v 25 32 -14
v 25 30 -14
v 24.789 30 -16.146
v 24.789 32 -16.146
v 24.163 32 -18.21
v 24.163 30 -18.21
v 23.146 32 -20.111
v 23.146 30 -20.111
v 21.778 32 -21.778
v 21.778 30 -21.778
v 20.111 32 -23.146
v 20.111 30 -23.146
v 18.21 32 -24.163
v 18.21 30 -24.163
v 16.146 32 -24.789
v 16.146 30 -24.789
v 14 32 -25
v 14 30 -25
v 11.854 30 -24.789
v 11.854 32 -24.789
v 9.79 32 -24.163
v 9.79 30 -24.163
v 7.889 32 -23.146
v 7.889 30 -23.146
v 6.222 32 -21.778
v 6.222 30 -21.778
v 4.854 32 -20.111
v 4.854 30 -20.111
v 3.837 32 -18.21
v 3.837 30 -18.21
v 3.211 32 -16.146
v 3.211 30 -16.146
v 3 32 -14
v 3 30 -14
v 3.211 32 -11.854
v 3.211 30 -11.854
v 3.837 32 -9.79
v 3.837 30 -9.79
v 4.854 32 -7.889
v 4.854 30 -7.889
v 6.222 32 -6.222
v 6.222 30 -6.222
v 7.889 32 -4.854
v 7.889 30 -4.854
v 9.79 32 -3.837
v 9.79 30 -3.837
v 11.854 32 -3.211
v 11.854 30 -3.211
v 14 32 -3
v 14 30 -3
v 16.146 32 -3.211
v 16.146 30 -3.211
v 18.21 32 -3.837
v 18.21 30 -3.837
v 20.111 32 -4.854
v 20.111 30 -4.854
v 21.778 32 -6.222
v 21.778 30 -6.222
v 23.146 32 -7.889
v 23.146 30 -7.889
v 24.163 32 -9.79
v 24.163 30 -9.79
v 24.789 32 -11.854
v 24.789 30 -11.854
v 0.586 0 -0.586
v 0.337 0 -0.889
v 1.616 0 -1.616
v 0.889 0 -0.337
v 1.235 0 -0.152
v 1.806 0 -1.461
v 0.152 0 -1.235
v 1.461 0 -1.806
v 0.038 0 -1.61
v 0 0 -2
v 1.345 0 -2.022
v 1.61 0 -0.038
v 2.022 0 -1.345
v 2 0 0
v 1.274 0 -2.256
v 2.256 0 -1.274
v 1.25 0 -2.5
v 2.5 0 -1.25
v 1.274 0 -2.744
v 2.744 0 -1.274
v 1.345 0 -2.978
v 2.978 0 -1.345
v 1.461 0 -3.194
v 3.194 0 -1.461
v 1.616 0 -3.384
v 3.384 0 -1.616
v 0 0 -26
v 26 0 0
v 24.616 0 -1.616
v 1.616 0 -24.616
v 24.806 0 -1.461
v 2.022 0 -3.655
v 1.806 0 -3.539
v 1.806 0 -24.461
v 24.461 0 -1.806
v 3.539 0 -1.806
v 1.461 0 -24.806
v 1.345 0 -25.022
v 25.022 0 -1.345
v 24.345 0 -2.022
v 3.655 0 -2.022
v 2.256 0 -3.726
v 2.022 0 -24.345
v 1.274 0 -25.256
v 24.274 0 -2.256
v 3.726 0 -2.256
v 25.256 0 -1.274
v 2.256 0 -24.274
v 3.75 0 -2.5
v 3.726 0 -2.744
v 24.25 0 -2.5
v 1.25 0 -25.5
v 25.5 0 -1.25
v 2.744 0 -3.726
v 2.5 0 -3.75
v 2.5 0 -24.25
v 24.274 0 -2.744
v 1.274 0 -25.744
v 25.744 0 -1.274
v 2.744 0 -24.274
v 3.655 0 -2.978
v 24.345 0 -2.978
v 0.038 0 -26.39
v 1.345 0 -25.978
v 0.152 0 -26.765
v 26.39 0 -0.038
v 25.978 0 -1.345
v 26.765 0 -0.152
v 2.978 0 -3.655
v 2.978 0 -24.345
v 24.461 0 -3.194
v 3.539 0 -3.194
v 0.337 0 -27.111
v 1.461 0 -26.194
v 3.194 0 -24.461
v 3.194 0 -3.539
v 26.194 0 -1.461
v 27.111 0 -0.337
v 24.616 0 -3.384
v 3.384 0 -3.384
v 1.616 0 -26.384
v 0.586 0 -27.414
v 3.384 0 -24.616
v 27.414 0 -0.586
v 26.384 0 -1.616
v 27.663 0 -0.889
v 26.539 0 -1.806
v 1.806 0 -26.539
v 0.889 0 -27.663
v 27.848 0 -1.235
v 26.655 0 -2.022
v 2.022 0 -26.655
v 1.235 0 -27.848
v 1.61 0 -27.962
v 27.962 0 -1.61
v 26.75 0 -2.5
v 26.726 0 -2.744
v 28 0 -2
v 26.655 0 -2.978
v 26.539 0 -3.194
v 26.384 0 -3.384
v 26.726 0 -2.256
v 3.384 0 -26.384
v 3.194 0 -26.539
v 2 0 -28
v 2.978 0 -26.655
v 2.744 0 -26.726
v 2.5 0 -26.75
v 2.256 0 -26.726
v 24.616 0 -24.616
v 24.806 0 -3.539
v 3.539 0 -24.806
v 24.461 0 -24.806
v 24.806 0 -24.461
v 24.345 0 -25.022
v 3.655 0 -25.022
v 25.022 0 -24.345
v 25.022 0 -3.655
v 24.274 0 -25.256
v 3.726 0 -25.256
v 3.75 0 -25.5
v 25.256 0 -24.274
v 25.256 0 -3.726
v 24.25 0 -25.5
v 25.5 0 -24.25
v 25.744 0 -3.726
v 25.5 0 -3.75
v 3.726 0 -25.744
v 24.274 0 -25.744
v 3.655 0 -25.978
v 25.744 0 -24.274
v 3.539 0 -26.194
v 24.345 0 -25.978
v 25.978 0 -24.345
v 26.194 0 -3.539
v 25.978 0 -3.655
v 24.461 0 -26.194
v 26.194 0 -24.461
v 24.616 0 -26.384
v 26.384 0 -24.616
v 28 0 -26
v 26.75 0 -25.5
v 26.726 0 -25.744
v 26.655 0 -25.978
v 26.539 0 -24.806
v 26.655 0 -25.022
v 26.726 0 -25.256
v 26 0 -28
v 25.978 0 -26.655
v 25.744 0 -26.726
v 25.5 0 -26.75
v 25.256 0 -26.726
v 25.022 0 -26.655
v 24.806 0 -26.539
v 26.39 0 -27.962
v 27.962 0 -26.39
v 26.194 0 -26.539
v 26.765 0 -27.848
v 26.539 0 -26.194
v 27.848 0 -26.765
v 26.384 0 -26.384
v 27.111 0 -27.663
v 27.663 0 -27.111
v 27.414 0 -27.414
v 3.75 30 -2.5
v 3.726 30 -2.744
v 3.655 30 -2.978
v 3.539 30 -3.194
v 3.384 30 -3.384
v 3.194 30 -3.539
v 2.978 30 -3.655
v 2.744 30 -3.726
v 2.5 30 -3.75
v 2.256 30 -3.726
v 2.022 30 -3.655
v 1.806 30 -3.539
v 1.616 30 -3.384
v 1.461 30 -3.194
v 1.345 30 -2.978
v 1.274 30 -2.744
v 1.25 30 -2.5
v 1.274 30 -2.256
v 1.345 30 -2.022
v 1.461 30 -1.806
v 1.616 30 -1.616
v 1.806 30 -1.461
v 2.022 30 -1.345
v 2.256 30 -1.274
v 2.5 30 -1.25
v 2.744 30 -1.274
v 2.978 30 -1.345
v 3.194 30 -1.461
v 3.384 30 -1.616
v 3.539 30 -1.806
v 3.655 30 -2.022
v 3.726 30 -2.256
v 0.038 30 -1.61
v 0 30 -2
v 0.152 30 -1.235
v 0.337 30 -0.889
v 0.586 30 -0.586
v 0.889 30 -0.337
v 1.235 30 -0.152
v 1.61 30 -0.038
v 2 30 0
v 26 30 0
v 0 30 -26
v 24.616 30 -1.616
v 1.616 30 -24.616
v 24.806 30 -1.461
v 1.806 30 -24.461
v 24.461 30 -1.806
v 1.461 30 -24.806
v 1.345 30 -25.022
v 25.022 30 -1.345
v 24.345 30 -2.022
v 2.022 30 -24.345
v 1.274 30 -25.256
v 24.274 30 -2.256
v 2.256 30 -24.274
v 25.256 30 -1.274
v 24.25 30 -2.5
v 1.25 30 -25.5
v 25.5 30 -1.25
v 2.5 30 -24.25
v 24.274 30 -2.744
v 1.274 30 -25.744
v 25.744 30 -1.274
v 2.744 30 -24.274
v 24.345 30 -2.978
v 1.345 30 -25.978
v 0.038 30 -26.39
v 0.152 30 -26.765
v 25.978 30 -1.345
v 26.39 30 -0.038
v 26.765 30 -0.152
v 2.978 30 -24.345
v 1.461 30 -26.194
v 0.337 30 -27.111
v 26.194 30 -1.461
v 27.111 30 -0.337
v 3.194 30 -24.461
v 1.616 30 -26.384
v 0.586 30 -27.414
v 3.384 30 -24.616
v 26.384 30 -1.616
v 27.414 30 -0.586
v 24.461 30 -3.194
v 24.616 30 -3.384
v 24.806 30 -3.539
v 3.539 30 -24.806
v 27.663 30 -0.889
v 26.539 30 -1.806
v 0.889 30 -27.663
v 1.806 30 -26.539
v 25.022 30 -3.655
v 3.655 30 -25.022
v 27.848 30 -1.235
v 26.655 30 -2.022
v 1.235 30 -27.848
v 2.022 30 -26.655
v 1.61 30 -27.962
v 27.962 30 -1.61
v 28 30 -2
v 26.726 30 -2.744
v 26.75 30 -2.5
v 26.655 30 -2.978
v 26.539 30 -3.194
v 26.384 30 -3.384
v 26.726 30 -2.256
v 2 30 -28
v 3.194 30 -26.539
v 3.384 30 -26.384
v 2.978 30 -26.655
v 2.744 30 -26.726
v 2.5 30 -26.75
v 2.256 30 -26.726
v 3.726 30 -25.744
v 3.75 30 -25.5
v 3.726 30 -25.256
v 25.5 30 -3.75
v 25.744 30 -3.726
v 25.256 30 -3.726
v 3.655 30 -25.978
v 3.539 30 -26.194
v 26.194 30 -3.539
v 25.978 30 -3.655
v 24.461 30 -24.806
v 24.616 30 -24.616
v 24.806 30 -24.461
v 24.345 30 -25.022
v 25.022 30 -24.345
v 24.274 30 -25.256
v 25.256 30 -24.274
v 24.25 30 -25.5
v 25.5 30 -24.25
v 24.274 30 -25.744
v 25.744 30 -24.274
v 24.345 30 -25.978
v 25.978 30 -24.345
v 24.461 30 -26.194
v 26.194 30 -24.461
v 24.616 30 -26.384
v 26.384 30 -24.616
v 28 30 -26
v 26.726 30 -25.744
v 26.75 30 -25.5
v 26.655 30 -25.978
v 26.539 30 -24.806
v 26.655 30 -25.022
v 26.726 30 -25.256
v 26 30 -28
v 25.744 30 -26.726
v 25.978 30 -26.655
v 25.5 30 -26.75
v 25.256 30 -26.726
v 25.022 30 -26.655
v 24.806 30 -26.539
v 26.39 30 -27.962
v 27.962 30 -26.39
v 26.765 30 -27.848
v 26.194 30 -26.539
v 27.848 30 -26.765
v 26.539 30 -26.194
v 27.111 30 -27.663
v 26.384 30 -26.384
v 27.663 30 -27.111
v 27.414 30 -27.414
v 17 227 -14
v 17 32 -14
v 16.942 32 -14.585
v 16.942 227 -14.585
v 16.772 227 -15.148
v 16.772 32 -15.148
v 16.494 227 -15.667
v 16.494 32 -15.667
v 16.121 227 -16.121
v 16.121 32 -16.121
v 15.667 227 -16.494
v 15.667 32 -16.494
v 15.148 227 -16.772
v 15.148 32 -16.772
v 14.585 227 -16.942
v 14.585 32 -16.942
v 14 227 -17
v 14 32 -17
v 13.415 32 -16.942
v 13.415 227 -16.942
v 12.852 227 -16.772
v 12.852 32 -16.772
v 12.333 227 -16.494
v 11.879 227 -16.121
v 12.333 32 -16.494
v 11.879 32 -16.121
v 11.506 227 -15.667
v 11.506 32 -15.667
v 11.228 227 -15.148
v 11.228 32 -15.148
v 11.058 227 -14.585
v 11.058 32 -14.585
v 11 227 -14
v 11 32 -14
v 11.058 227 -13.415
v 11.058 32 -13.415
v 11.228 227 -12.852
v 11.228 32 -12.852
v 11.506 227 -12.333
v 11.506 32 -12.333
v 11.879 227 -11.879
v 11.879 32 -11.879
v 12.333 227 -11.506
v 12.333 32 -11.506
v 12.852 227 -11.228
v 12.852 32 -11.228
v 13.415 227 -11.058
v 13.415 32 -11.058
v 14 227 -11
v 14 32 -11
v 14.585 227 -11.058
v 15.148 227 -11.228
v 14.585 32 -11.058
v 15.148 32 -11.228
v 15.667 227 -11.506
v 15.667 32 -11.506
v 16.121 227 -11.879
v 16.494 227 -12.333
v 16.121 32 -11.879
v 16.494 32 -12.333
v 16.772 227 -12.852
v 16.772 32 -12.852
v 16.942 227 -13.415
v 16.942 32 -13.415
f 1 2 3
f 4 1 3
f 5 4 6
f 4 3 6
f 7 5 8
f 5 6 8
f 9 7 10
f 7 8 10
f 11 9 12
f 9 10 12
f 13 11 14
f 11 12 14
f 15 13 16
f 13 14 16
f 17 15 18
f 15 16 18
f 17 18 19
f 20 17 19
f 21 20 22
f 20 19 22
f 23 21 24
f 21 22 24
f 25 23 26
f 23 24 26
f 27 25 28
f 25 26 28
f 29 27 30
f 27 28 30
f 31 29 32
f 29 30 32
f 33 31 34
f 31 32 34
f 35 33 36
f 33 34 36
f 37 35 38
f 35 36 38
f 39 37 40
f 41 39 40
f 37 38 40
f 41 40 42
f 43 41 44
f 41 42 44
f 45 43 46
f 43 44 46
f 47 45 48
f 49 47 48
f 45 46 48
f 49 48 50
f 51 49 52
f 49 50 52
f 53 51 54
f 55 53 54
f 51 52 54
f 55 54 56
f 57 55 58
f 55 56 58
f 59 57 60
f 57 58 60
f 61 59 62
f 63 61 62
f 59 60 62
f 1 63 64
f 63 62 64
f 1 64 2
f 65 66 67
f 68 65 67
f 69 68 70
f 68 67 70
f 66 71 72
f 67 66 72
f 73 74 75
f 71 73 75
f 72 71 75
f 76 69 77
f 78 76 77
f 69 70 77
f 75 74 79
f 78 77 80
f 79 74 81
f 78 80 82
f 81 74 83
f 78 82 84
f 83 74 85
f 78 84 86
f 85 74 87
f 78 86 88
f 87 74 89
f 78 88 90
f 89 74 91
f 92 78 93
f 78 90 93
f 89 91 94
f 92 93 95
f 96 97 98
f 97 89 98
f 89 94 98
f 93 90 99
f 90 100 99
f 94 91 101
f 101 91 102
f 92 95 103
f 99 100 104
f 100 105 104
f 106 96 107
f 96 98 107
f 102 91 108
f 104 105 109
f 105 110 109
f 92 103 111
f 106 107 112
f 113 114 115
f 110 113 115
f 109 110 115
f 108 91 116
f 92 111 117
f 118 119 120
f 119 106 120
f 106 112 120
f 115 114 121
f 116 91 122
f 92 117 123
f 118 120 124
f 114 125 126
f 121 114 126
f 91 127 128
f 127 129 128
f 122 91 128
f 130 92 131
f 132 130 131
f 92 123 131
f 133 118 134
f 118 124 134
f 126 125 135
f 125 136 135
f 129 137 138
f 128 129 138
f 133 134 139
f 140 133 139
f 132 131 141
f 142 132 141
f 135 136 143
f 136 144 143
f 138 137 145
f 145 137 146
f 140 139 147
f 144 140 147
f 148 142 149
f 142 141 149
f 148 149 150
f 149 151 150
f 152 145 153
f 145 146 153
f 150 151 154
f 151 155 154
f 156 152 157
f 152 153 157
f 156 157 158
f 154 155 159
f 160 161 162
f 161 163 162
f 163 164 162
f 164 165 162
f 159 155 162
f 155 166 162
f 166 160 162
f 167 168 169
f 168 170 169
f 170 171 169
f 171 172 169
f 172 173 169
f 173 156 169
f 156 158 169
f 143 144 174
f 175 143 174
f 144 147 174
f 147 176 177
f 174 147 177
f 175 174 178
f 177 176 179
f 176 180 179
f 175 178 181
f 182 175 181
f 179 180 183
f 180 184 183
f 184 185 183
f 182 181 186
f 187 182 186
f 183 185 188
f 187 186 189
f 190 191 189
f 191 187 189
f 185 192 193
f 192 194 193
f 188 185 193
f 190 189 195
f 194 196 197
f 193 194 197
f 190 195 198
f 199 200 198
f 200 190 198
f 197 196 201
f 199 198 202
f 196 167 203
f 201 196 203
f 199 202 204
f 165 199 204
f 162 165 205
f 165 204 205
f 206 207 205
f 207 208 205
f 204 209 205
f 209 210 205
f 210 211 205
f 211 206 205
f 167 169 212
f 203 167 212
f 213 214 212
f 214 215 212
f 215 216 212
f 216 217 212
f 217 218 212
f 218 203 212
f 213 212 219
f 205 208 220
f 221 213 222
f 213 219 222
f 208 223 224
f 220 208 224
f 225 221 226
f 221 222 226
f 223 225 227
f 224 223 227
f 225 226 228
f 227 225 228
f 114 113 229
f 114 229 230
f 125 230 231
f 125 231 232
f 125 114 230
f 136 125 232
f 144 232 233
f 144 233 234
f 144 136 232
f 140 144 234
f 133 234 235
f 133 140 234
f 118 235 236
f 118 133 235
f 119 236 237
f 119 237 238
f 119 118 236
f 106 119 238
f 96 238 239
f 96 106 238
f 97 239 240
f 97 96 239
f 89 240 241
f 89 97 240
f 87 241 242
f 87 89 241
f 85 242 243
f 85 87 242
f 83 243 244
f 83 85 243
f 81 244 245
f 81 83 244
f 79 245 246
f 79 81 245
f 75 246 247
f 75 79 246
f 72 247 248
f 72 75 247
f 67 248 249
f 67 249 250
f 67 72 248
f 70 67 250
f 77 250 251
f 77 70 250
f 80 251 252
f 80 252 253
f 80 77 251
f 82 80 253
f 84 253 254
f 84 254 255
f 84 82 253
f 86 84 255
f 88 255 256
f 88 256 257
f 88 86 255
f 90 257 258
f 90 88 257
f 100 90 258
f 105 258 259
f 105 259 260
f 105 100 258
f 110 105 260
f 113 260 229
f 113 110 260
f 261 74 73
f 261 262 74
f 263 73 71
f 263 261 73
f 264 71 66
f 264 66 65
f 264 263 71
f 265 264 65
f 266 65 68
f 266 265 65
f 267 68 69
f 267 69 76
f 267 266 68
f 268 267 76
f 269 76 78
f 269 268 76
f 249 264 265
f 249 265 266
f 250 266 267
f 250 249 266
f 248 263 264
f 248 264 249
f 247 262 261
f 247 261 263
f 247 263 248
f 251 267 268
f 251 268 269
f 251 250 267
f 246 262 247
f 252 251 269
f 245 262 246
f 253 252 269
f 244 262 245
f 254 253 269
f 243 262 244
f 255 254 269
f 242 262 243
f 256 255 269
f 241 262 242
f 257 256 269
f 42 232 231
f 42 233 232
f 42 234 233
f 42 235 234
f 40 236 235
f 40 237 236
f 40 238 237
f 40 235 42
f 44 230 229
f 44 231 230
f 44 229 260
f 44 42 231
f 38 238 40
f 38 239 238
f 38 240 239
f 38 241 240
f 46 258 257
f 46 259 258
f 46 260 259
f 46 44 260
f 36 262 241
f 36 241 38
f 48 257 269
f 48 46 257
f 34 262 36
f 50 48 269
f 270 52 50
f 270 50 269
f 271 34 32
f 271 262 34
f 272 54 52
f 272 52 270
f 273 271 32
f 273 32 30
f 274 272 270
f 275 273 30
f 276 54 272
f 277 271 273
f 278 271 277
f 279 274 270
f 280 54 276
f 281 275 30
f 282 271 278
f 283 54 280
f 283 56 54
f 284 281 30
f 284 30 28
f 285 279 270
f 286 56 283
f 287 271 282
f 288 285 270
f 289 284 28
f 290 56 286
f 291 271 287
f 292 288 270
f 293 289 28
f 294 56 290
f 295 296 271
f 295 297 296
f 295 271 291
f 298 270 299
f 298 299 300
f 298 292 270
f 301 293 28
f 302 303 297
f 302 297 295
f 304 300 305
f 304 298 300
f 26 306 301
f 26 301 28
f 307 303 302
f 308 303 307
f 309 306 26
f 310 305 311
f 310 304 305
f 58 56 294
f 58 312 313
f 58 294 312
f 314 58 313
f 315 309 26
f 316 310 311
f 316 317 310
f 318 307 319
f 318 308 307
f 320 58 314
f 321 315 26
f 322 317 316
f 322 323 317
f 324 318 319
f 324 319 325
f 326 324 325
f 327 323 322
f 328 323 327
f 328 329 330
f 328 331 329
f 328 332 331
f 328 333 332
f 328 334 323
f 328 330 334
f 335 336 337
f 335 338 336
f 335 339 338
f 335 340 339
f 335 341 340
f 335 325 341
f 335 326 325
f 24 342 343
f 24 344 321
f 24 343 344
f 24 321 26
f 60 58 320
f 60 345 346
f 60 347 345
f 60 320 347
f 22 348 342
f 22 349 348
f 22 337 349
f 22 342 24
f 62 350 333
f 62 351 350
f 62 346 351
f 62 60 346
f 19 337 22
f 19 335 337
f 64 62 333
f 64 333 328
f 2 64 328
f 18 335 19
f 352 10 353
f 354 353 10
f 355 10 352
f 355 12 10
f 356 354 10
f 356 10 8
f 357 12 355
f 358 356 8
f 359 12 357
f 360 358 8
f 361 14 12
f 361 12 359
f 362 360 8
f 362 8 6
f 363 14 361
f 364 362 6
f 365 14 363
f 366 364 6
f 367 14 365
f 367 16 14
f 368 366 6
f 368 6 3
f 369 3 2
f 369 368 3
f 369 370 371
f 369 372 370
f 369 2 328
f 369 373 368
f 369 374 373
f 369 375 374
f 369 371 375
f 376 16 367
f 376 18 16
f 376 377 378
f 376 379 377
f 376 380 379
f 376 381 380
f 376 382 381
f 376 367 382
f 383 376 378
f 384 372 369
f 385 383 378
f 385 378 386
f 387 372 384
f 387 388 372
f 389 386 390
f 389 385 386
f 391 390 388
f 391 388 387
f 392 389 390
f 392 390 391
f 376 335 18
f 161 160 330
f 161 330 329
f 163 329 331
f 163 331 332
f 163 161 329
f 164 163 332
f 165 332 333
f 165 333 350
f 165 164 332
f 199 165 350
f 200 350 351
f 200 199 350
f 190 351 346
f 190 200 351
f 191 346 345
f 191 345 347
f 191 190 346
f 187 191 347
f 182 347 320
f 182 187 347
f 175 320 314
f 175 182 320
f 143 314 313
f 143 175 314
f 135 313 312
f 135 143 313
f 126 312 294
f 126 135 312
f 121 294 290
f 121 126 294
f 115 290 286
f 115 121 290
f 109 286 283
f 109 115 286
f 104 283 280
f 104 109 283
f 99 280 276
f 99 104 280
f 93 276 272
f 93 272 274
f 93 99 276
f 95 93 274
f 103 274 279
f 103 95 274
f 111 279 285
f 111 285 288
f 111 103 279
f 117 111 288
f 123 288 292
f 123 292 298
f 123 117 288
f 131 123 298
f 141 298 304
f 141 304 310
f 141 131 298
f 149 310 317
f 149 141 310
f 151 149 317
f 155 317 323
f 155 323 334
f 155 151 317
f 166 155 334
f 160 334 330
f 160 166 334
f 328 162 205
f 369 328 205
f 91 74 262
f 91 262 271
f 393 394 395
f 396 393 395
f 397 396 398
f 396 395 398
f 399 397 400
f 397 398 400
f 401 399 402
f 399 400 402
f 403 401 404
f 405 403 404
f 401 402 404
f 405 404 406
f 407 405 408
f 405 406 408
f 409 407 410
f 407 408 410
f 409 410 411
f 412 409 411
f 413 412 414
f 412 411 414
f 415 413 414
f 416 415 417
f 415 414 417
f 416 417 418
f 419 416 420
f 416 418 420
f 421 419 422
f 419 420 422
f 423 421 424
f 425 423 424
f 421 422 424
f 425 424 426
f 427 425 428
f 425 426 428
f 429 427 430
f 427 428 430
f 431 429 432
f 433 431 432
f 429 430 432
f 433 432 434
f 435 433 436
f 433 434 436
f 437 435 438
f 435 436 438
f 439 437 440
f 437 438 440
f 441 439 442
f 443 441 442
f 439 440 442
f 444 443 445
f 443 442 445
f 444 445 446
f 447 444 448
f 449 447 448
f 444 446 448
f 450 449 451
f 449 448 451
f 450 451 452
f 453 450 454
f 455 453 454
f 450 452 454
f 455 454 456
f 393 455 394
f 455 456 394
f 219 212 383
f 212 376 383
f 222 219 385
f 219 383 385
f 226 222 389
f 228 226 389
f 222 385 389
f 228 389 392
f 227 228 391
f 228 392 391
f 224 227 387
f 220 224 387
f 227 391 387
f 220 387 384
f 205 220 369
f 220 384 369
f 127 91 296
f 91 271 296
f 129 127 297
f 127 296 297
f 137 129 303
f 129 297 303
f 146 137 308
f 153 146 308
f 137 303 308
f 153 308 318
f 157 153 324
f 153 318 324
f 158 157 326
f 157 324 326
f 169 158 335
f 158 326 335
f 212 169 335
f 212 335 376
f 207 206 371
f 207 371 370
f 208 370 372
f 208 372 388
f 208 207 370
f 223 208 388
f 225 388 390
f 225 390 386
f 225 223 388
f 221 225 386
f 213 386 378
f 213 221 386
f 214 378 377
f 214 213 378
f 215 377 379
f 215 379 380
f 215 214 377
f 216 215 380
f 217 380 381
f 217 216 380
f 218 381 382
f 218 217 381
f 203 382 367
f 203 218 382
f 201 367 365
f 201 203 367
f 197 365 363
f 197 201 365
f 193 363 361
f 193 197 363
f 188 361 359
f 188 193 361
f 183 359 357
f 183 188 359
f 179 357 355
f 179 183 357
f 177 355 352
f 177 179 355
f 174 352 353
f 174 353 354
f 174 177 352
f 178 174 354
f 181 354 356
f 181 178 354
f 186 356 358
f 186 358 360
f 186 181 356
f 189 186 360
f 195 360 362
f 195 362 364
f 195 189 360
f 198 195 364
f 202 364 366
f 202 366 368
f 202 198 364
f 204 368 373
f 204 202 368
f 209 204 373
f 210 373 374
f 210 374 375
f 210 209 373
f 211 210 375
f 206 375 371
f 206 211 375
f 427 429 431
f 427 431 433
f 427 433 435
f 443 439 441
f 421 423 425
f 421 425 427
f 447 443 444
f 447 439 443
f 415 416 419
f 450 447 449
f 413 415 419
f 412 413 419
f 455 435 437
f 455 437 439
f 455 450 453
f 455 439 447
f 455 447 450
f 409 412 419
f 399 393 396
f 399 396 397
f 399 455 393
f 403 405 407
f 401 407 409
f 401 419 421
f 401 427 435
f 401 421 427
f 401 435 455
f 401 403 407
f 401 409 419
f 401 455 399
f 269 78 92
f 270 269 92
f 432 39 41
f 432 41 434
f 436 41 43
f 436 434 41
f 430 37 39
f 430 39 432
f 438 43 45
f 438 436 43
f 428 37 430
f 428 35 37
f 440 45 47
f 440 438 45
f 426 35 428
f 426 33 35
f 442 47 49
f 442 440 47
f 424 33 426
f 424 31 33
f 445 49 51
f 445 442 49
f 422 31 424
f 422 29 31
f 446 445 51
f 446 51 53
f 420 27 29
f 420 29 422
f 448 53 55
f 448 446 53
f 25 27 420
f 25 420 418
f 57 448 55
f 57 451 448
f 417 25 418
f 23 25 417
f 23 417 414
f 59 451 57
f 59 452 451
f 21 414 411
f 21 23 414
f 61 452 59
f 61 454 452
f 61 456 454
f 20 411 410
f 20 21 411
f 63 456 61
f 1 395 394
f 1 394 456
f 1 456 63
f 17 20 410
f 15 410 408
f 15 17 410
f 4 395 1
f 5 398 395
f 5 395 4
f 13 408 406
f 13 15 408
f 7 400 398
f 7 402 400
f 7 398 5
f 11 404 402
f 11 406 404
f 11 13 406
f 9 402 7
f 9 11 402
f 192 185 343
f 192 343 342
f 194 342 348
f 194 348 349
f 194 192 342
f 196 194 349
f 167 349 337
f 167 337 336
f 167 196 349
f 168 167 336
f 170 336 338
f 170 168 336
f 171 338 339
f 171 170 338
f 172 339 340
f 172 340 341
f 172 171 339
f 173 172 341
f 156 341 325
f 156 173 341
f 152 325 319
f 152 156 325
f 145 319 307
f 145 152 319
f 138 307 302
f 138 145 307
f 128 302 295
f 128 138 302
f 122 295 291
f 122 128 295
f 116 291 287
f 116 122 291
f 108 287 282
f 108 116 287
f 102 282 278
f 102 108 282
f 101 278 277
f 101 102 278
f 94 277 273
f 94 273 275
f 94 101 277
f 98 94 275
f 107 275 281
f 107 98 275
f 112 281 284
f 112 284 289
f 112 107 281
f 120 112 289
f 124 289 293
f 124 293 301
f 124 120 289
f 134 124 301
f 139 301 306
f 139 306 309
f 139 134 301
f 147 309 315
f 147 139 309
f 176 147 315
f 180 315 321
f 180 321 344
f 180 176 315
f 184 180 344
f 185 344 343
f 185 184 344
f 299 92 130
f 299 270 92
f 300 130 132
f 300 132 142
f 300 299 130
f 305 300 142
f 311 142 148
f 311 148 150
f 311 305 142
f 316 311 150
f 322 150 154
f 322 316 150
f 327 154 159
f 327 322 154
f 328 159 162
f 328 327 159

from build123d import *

# Parameters (mm, degrees)
SKETCH1_W           = 28
SKETCH1_H           = 28
SKETCH1_R           = 1.25
BOSS_EXTRUDE1_DEPTH = 30
SKETCH2_R           = 11
BOSS_EXTRUDE2_DEPTH = 2
SKETCH3_R           = 3
BOSS_EXTRUDE3_DEPTH = 195
FILLET1_R           = 2


with BuildPart() as part:
    # Sketch1 → Boss-Extrude1 (new body)
    with BuildSketch(Plane(origin=(0, 0, 0), x_dir=(1, 0, 0), z_dir=(0, 1, 0))):
        with Locations((14, 14)):
            Rectangle(SKETCH1_W, SKETCH1_H)
        with Locations((2.5, 25.5)):
            Circle(SKETCH1_R, mode=Mode.SUBTRACT)
        with Locations((2.5, 2.5)):
            Circle(SKETCH1_R, mode=Mode.SUBTRACT)
        with Locations((25.5, 2.5)):
            Circle(SKETCH1_R, mode=Mode.SUBTRACT)
        with Locations((25.5, 25.5)):
            Circle(SKETCH1_R, mode=Mode.SUBTRACT)
    extrude(amount=BOSS_EXTRUDE1_DEPTH)

    # Sketch2 → Boss-Extrude2 (add)
    with BuildSketch(Plane(origin=(0, 30, 0), x_dir=(1, 0, 0), z_dir=(0, 1, 0))):
        with Locations((14, 14)):
            Circle(SKETCH2_R)
    extrude(amount=BOSS_EXTRUDE2_DEPTH)

    # Sketch3 → Boss-Extrude3 (add)
    with BuildSketch(Plane(origin=(0, 32, 0), x_dir=(1, 0, 0), z_dir=(0, 1, 0))):
        with Locations((14, 14)):
            Circle(SKETCH3_R)
    extrude(amount=BOSS_EXTRUDE3_DEPTH)

    # Fillet1
    fillet1_edges = [part.edges().sort_by_distance(p)[0] for p in [
        (0, 15, -28),
        (28, 15, -28),
        (28, 15, 0),
        (0, 15, 0),
    ]]
    fillet(fillet1_edges, radius=FILLET1_R)


solid = part.part
